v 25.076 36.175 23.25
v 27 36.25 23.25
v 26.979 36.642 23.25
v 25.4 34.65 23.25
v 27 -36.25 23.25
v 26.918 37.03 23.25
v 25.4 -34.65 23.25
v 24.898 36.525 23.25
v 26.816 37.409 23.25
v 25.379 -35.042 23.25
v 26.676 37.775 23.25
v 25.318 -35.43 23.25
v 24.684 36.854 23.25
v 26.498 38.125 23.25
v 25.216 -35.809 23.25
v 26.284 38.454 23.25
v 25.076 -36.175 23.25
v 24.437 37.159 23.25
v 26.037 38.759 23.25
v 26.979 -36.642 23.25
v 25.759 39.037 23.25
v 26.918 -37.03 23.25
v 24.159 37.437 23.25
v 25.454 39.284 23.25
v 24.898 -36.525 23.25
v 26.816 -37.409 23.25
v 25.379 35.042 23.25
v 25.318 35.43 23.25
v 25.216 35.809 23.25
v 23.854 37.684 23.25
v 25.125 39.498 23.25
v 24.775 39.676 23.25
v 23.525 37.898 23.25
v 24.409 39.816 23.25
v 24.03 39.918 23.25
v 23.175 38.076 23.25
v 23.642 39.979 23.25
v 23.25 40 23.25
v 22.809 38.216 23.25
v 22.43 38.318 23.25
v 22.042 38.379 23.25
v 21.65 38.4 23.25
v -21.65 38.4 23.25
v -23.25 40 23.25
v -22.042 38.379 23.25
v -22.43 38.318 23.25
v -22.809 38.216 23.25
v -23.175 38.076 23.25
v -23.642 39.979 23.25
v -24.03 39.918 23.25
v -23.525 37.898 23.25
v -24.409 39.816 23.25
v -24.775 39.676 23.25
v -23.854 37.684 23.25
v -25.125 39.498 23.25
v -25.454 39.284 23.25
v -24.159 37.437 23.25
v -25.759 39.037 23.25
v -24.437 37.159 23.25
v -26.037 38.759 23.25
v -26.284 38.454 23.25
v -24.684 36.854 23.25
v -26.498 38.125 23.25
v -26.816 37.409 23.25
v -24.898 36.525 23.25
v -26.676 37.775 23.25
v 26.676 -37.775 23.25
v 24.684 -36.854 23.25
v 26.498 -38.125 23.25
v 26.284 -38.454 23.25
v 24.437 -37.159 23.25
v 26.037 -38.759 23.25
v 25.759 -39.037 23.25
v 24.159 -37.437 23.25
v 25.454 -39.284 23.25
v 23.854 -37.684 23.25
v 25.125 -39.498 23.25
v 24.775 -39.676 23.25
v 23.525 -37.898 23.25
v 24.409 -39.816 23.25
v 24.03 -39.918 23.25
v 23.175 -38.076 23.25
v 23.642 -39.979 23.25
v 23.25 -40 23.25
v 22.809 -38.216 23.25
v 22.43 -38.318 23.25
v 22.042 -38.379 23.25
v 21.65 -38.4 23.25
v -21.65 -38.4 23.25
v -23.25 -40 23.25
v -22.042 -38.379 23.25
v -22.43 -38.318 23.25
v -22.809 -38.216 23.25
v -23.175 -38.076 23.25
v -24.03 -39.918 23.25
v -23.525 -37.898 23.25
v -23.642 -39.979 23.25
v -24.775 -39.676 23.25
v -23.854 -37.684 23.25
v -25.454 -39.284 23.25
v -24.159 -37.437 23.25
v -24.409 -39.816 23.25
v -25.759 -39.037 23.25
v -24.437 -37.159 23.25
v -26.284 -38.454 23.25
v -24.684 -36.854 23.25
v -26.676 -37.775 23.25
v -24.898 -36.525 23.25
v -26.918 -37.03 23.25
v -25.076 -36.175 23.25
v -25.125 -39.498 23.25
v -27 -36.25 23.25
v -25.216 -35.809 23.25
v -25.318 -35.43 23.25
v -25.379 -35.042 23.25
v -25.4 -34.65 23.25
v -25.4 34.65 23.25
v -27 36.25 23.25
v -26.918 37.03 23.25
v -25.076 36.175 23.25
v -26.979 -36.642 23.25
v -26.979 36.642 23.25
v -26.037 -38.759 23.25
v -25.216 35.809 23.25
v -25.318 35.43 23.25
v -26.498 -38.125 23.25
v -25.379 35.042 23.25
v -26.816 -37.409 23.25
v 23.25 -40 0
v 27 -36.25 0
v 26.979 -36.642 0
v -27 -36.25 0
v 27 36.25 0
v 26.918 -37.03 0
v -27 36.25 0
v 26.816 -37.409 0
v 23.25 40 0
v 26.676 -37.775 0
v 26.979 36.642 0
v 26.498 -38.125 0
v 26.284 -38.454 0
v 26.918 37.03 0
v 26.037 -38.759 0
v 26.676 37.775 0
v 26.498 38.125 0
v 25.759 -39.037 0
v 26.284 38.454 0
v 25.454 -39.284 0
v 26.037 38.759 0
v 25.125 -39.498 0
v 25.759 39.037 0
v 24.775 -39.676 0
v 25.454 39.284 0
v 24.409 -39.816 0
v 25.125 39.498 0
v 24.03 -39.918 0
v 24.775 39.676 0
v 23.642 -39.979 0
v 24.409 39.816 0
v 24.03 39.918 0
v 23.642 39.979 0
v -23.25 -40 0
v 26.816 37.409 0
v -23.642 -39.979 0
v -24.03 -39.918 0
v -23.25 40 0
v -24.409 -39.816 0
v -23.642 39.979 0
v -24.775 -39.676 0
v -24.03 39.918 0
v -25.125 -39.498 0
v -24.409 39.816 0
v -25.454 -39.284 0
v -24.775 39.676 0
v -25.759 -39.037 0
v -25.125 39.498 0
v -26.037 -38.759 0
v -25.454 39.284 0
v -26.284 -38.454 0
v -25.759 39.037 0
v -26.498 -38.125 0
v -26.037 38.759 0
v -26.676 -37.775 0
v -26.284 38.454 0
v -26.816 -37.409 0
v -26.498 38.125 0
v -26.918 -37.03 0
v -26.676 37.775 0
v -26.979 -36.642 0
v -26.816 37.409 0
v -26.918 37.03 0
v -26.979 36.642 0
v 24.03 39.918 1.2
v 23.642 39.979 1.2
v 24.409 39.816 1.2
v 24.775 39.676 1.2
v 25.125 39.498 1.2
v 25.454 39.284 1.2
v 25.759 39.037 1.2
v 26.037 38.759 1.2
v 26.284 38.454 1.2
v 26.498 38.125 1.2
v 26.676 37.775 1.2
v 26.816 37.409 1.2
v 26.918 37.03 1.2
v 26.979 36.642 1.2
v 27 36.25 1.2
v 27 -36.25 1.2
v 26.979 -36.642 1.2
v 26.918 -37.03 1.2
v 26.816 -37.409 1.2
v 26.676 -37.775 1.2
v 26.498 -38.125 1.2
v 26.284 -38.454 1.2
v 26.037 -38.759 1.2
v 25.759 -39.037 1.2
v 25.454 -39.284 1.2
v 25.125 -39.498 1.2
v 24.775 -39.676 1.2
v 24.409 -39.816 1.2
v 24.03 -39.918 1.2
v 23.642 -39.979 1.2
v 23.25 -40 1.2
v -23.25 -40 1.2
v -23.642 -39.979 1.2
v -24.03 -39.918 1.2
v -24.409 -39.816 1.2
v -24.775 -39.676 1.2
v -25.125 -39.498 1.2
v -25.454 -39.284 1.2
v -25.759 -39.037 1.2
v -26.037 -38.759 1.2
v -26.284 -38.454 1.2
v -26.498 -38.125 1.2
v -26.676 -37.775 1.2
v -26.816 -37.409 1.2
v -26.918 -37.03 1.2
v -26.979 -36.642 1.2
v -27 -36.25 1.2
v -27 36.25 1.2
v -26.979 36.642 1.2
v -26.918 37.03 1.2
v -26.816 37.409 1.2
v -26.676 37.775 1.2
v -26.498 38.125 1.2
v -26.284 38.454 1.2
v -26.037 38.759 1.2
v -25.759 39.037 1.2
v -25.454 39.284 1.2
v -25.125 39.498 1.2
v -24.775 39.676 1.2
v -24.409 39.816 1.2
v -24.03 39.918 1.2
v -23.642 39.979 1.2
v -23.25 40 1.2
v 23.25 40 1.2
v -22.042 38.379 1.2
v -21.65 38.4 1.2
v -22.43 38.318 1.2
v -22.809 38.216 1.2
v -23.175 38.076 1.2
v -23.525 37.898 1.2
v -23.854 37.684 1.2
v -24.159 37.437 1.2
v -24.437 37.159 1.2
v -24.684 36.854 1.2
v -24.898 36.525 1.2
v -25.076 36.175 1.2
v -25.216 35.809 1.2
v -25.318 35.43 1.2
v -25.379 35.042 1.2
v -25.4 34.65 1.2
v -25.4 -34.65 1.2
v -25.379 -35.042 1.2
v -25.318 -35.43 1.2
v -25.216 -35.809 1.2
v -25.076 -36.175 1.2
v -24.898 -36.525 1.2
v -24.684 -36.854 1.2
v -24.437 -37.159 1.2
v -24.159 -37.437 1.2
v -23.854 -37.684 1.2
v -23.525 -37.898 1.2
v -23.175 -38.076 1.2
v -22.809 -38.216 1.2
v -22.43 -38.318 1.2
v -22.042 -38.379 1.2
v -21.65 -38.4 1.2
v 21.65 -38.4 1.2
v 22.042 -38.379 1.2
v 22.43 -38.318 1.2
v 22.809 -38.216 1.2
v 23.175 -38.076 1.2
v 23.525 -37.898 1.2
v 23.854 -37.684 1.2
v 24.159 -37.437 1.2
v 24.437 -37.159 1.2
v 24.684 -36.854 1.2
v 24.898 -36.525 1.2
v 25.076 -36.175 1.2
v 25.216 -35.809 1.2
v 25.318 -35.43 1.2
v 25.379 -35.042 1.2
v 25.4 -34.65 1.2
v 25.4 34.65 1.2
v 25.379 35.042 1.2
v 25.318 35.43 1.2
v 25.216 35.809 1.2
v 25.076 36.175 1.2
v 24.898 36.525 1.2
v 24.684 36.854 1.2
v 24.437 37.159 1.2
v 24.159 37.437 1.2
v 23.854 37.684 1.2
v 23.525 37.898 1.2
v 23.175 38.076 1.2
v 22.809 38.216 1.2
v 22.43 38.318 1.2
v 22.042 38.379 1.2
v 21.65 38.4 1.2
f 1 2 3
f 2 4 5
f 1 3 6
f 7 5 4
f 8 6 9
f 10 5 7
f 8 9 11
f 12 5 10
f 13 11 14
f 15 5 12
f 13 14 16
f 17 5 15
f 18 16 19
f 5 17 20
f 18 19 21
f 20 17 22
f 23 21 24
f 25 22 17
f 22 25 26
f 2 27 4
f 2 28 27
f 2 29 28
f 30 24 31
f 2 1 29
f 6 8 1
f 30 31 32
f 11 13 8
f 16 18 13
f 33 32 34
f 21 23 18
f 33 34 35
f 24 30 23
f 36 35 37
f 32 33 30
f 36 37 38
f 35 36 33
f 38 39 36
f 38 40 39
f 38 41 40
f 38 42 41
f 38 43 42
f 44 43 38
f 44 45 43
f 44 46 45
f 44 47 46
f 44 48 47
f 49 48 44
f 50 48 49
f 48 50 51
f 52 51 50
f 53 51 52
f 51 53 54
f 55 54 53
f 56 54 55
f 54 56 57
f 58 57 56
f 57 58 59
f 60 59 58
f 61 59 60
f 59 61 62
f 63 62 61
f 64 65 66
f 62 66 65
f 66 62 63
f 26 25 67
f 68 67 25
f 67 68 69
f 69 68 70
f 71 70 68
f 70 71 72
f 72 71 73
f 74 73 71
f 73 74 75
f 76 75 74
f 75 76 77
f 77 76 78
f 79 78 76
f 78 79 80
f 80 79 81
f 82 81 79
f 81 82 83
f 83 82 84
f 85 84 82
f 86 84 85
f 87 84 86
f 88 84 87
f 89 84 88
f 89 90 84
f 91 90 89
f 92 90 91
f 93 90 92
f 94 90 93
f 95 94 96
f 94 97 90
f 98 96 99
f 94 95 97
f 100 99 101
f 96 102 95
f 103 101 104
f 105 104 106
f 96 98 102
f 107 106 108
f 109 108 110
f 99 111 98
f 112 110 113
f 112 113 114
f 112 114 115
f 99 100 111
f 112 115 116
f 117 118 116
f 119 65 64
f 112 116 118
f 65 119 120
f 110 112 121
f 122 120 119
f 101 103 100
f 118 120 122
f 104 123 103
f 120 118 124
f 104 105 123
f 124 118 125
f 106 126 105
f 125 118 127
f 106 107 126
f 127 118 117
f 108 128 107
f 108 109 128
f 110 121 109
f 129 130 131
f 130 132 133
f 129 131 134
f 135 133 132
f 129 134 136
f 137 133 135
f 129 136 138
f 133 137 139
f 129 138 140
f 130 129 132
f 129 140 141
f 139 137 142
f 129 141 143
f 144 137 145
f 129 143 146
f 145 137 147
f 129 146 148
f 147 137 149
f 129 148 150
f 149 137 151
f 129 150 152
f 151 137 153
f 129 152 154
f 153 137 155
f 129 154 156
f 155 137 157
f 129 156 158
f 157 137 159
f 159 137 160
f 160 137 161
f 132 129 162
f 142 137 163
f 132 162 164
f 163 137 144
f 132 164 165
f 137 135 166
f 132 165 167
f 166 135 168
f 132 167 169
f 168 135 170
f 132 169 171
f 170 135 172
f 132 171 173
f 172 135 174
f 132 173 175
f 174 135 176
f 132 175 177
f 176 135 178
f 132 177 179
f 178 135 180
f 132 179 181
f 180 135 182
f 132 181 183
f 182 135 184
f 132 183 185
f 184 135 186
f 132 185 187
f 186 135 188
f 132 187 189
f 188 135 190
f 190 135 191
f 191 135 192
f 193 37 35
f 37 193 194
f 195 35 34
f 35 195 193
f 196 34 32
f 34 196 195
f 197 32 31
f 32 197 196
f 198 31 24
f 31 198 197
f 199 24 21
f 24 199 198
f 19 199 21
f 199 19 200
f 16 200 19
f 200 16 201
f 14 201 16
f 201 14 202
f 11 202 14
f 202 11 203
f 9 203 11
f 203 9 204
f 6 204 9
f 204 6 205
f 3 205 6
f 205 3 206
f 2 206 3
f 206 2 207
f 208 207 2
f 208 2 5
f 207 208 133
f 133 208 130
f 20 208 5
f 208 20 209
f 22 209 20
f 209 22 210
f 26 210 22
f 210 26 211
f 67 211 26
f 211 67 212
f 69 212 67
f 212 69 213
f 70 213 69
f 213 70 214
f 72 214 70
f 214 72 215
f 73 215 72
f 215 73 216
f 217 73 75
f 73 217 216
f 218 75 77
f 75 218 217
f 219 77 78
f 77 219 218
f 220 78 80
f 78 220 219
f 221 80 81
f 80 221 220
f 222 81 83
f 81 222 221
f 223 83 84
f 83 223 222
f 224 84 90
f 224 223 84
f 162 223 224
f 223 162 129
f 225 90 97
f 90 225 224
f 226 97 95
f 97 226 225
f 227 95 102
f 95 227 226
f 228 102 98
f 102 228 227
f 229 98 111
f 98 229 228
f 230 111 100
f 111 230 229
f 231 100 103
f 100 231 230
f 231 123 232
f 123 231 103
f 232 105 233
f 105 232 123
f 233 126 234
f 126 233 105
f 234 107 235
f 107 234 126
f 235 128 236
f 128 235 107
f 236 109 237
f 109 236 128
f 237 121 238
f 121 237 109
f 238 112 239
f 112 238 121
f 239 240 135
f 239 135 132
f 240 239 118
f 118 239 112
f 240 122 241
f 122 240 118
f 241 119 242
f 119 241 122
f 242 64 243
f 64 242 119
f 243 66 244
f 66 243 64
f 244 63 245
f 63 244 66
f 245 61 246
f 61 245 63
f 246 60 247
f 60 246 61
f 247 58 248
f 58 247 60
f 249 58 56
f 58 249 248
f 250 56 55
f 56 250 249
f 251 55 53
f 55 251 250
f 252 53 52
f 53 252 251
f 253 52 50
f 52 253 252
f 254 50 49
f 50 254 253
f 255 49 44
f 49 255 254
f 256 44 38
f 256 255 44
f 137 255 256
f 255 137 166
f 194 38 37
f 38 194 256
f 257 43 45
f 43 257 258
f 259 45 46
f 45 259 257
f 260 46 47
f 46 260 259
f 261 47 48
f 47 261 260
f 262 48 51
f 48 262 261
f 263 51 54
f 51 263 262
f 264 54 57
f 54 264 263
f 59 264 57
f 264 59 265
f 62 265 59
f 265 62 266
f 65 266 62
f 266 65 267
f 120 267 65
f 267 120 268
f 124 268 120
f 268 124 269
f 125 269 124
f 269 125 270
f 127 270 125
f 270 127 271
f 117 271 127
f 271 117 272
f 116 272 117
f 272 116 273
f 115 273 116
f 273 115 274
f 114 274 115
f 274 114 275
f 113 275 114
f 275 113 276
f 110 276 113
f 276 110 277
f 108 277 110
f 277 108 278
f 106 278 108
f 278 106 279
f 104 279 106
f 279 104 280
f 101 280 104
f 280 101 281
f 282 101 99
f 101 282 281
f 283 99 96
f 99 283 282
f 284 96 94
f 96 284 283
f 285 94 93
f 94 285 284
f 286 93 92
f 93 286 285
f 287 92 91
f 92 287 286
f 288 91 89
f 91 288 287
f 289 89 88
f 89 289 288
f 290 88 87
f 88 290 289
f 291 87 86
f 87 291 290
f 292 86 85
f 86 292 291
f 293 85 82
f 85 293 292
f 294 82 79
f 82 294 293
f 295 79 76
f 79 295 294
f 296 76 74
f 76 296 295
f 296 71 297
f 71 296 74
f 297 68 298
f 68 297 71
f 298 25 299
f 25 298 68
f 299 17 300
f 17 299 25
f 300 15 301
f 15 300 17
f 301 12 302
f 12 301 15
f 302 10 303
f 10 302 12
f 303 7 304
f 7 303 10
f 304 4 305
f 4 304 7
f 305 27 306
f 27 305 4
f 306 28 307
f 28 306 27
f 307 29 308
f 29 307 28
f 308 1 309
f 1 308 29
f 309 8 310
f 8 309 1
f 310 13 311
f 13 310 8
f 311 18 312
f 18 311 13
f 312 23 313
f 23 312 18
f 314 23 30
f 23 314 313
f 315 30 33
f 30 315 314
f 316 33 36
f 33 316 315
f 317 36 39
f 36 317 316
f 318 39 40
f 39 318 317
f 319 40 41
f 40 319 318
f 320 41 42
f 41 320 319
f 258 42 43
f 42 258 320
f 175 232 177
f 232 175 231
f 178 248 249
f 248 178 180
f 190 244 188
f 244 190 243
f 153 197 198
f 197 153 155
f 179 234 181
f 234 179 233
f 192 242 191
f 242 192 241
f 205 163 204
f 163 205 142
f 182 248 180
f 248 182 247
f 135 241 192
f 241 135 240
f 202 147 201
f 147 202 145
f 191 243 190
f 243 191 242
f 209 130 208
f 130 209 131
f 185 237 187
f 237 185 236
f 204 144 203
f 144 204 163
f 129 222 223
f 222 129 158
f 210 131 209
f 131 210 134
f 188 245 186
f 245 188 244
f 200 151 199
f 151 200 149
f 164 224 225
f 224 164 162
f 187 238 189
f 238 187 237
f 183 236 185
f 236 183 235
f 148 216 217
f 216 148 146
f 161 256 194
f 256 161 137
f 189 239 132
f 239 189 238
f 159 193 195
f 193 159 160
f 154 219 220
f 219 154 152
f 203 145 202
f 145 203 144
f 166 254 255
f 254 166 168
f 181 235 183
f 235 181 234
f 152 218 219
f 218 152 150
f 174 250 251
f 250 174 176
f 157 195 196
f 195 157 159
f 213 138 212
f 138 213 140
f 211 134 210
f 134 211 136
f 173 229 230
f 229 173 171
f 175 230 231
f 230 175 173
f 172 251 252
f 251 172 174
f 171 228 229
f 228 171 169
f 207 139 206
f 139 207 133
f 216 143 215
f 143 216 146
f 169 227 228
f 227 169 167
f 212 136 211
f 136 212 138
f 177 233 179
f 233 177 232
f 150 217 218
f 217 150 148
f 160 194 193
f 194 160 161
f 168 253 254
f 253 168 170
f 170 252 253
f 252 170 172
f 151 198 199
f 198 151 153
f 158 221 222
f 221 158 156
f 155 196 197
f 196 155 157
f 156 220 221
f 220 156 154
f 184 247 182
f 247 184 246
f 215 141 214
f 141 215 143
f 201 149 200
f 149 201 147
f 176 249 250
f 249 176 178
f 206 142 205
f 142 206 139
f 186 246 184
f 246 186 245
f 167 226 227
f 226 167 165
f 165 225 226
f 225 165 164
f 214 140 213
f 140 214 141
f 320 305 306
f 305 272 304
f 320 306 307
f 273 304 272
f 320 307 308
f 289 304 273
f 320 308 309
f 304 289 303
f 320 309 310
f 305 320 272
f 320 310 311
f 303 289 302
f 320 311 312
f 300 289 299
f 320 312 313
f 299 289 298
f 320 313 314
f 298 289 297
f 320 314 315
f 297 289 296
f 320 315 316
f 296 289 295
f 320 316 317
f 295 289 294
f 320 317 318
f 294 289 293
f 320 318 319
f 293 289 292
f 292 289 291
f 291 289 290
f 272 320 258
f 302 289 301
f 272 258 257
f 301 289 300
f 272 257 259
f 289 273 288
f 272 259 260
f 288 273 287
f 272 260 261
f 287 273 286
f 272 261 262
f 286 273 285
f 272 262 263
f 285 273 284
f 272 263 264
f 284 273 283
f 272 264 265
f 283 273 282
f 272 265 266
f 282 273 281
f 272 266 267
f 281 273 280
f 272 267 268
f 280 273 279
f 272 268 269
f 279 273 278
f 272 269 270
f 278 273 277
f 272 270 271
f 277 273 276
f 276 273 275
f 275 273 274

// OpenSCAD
/* medium-bins.scad
 *
 * Copyright (C) Robert B. Ross, 2016
 *
 * This software is released under the Creative Commons
 * Attribution-ShareAlike 4.0 International Public License.
 */

/* Note: Abusing roundBoxBottom() a lot in this source, to create whole
 *       forms for diff()'ing, etc.
 */

include <./bintools.scad>

/* Harbor Freight Medium
 * 46.5mm tall
 * 48.6mm tall with legs
 * 80mm wide, 77 bottom
 * 54mm length, 52 bottom
 */

/* Harbor Freight Small
 * 46.5mm tall
 * 48.6mm tall with legs
 * 54mm wide
 * 39.25mm length
 */

mediumBin();
// mediumSplitBin();

module mediumBin() {
   harborFreightMediumHalfHt(locations=[],inset=0.5,filled=0,cornerRad=3.75,
                             bottomThick=1.2);
   if (0) {
      roundShapedBox(xDimTop=54, yDimTop=80, xDimBottom=54,
                     yDimBottom=80, ht=46.5/2, wallThick=1.6);
      roundBoxBottom(xDim=53,yDim=78.5,ht=1.2);
   }
}

module mediumSplitBin() {
   difference() {
      /* abusing roundBoxBottom() to make entire box shape */
      roundBoxBottom(xDim=80, yDim=54, ht=46.5/2);

      translate([-39.25/2,0,1.2])
         roundBoxBottom(xDim=37.5, yDim=50.8, ht=46.5/2);
      translate([+39.25/2,0,1.2])
         roundBoxBottom(xDim=37.5, yDim=50.8, ht=46.5/2);
   }
}

/*
 * Local variables:
 *  mode: C
 *  c-indent-level: 4
 *  c-basic-offset: 4
 * End:
 *
 * vim: ts=8 sts=4 sw=4 expandtab
 */
